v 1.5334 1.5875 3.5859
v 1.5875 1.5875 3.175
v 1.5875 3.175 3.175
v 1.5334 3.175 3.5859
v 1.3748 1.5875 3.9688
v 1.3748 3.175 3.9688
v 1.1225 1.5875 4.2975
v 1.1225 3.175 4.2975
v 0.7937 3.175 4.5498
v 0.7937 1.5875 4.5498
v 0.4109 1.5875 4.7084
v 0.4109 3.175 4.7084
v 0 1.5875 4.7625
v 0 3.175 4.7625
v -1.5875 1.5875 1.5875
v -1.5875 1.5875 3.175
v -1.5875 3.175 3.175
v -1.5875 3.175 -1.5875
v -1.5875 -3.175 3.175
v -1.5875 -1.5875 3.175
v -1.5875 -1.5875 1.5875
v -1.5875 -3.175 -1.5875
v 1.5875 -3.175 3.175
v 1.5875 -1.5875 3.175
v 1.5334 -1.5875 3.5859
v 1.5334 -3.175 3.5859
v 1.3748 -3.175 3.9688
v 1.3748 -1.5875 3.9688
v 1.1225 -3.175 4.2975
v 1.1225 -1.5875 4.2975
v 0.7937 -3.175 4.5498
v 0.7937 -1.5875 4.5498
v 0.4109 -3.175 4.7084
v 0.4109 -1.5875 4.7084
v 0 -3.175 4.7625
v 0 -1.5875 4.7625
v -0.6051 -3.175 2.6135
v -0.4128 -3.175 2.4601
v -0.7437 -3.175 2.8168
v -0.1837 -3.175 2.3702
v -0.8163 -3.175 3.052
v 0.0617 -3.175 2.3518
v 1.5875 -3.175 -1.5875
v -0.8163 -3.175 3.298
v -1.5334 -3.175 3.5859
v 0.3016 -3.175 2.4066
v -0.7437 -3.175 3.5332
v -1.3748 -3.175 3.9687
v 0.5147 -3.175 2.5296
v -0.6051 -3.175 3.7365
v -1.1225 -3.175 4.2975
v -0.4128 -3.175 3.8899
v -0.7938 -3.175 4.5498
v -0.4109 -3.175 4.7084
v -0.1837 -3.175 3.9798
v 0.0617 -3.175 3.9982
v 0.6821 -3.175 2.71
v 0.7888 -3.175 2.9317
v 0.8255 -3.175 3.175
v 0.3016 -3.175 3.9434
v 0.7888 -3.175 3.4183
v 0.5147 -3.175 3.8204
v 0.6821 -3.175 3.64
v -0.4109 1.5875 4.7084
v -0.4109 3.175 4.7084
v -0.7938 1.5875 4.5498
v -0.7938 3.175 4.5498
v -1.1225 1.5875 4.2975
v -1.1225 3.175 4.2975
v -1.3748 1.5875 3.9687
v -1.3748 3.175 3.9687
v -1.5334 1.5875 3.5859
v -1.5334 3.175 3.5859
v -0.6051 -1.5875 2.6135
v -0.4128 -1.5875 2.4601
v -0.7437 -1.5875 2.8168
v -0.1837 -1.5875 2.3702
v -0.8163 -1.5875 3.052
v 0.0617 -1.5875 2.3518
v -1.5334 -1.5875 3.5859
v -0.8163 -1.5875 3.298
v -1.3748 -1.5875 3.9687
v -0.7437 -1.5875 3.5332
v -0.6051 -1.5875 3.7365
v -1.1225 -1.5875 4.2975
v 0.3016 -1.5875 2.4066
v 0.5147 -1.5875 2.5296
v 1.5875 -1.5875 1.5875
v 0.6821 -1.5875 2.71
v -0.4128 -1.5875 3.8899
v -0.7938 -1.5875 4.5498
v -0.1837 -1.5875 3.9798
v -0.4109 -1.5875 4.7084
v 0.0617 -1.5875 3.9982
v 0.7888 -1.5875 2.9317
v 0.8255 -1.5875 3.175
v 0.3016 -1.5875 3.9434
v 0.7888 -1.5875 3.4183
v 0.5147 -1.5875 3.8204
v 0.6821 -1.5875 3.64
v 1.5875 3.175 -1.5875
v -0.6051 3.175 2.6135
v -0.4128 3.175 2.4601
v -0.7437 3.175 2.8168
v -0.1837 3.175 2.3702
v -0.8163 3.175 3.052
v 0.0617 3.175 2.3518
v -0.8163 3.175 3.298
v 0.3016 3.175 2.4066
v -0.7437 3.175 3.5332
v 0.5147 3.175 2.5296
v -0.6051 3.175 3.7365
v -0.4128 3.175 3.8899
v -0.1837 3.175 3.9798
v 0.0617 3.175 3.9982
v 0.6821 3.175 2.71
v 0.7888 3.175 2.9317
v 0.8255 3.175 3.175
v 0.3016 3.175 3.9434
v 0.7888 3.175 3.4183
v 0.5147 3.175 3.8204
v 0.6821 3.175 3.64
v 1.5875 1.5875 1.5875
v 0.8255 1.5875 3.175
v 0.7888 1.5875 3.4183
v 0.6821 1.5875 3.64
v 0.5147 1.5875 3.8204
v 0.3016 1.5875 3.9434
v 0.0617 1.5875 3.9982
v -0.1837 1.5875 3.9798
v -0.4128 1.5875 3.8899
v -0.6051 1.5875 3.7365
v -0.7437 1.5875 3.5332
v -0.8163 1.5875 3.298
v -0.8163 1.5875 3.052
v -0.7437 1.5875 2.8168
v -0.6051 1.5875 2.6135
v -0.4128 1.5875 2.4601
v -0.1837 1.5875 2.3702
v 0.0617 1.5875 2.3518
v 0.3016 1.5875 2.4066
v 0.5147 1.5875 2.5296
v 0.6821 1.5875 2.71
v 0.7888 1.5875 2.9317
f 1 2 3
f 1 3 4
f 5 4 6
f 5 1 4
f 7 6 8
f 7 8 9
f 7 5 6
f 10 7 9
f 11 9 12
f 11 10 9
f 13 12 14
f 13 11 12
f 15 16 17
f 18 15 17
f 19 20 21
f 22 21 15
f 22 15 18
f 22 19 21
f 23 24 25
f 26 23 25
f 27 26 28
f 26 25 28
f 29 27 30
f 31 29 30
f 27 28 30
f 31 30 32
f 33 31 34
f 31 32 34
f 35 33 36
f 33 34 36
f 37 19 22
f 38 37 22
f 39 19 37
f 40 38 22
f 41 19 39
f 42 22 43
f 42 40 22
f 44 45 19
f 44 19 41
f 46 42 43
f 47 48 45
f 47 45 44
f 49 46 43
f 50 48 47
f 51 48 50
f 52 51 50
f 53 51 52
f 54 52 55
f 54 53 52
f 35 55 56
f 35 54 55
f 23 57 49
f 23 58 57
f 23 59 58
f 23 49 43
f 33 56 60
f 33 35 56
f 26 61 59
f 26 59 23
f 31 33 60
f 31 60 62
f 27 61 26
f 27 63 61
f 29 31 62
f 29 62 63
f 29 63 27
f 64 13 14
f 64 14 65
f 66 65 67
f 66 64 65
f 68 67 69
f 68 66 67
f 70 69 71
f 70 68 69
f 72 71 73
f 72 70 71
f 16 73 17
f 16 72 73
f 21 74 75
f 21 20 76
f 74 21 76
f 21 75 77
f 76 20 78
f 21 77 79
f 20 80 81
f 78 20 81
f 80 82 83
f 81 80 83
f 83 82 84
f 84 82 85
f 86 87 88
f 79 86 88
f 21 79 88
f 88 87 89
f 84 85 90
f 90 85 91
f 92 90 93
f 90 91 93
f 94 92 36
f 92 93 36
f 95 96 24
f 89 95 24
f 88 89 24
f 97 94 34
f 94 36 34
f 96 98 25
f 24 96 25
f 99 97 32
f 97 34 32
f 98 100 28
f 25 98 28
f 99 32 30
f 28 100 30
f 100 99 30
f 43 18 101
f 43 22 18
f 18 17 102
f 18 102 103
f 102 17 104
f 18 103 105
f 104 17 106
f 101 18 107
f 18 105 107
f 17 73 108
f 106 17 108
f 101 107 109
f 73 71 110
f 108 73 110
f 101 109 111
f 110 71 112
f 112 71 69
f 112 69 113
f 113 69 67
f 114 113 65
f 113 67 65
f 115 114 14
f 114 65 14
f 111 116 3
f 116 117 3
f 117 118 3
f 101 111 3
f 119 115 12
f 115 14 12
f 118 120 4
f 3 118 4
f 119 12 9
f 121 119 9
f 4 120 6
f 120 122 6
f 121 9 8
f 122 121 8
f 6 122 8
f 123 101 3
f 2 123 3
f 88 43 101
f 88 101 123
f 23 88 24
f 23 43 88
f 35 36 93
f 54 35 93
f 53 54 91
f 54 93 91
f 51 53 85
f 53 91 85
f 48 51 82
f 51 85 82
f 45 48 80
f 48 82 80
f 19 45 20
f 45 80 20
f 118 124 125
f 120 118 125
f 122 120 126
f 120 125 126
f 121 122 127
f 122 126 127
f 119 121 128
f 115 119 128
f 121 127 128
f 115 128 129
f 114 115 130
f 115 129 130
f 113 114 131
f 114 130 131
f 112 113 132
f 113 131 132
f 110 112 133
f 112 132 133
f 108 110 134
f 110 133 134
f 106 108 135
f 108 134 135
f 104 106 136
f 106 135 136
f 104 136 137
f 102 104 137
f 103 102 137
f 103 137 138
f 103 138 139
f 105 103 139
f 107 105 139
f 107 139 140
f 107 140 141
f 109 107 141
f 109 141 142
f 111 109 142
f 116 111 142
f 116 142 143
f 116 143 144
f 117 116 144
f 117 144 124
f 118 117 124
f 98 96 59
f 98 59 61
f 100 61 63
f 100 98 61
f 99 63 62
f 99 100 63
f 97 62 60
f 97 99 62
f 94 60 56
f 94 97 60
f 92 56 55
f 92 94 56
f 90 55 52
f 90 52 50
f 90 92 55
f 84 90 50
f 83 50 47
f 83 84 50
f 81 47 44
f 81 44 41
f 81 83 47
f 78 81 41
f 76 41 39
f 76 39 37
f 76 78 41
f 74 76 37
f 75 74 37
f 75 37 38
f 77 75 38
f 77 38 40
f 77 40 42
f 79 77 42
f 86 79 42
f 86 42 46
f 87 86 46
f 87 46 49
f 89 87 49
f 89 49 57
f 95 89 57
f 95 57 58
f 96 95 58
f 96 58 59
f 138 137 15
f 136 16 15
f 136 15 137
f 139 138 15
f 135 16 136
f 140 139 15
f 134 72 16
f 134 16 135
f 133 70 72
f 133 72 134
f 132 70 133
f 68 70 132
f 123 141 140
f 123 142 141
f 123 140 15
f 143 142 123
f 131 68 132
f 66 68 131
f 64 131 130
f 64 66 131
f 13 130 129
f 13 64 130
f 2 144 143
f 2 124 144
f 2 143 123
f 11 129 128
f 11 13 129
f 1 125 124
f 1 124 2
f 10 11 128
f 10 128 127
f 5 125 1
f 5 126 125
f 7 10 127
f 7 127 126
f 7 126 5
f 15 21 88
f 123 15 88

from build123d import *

# Parameters (mm, degrees)
F0_R     = 0.8255
F1_DEPTH = 3.175
F2_DEPTH = 1.5875


with BuildPart() as f1:
    # F0 (on Front) → F1 (new body, symmetric)
    with BuildSketch(Plane.XZ):
        Polygon((-1.5875, -1.5875), (1.5875, -1.5875), (1.5875, 1.5875), (0, 1.5875), (-1.5875, 1.5875), align=None)
        with BuildLine():
            ThreePointArc((-1.5875, 3.175), (-1.1225320151, 2.0524679849), (0, 1.5875))
            ThreePointArc((0, 1.5875), (1.1225320151, 2.0524679849), (1.5875, 3.175))
            ThreePointArc((1.5875, 3.175), (1.1225320091, 4.2975320212), (-1.72e-08, 4.7625))
            ThreePointArc((-1.72e-08, 4.7625), (-1.1225320212, 4.2975320091), (-1.5875, 3.175))
        make_face()
        with Locations((0, 3.175)):
            Circle(F0_R, mode=Mode.SUBTRACT)
        with BuildLine():
            Line((0, 1.5875), (1.5875, 1.5875))
            Line((1.5875, 1.5875), (1.5875, 3.175))
            ThreePointArc((1.5875, 3.175), (1.1225320151, 2.0524679849), (0, 1.5875))
        make_face()
        with BuildLine():
            Line((-1.5875, 3.175), (-1.5875, 1.5875))
            Line((-1.5875, 1.5875), (0, 1.5875))
            ThreePointArc((0, 1.5875), (-1.1225320151, 2.0524679849), (-1.5875, 3.175))
        make_face()
    extrude(amount=F1_DEPTH, both=True)

    # F0 (on Front) → F2 (cut, symmetric)
    with BuildSketch(Plane.XZ):
        with BuildLine():
            Line((-2.54, 1.5875), (-1.5875, 1.5875))
            Line((-1.5875, 1.5875), (-1.5875, 3.175))
            ThreePointArc((-1.5875, 3.175), (-1.1225320212, 4.2975320091), (-1.72e-08, 4.7625))
            Line((-1.72e-08, 4.7625), (-2.54, 4.7625))
            Line((-2.54, 4.7625), (-2.54, 1.5875))
        make_face()
        with BuildLine():
            Line((-1.5875, 3.175), (-1.5875, 1.5875))
            Line((-1.5875, 1.5875), (0, 1.5875))
            ThreePointArc((0, 1.5875), (-1.1225320151, 2.0524679849), (-1.5875, 3.175))
        make_face()
        with BuildLine():
            ThreePointArc((-1.5875, 3.175), (-1.1225320151, 2.0524679849), (0, 1.5875))
            ThreePointArc((0, 1.5875), (1.1225320151, 2.0524679849), (1.5875, 3.175))
            ThreePointArc((1.5875, 3.175), (1.1225320091, 4.2975320212), (-1.72e-08, 4.7625))
            ThreePointArc((-1.72e-08, 4.7625), (-1.1225320212, 4.2975320091), (-1.5875, 3.175))
        make_face()
        with Locations((0, 3.175)):
            Circle(F0_R, mode=Mode.SUBTRACT)
        with Locations((0, 3.175)):
            Circle(F0_R)
        with BuildLine():
            Line((0, 1.5875), (1.5875, 1.5875))
            Line((1.5875, 1.5875), (1.5875, 3.175))
            ThreePointArc((1.5875, 3.175), (1.1225320151, 2.0524679849), (0, 1.5875))
        make_face()
    extrude(amount=F2_DEPTH, both=True, mode=Mode.SUBTRACT)


solid = f1.part
